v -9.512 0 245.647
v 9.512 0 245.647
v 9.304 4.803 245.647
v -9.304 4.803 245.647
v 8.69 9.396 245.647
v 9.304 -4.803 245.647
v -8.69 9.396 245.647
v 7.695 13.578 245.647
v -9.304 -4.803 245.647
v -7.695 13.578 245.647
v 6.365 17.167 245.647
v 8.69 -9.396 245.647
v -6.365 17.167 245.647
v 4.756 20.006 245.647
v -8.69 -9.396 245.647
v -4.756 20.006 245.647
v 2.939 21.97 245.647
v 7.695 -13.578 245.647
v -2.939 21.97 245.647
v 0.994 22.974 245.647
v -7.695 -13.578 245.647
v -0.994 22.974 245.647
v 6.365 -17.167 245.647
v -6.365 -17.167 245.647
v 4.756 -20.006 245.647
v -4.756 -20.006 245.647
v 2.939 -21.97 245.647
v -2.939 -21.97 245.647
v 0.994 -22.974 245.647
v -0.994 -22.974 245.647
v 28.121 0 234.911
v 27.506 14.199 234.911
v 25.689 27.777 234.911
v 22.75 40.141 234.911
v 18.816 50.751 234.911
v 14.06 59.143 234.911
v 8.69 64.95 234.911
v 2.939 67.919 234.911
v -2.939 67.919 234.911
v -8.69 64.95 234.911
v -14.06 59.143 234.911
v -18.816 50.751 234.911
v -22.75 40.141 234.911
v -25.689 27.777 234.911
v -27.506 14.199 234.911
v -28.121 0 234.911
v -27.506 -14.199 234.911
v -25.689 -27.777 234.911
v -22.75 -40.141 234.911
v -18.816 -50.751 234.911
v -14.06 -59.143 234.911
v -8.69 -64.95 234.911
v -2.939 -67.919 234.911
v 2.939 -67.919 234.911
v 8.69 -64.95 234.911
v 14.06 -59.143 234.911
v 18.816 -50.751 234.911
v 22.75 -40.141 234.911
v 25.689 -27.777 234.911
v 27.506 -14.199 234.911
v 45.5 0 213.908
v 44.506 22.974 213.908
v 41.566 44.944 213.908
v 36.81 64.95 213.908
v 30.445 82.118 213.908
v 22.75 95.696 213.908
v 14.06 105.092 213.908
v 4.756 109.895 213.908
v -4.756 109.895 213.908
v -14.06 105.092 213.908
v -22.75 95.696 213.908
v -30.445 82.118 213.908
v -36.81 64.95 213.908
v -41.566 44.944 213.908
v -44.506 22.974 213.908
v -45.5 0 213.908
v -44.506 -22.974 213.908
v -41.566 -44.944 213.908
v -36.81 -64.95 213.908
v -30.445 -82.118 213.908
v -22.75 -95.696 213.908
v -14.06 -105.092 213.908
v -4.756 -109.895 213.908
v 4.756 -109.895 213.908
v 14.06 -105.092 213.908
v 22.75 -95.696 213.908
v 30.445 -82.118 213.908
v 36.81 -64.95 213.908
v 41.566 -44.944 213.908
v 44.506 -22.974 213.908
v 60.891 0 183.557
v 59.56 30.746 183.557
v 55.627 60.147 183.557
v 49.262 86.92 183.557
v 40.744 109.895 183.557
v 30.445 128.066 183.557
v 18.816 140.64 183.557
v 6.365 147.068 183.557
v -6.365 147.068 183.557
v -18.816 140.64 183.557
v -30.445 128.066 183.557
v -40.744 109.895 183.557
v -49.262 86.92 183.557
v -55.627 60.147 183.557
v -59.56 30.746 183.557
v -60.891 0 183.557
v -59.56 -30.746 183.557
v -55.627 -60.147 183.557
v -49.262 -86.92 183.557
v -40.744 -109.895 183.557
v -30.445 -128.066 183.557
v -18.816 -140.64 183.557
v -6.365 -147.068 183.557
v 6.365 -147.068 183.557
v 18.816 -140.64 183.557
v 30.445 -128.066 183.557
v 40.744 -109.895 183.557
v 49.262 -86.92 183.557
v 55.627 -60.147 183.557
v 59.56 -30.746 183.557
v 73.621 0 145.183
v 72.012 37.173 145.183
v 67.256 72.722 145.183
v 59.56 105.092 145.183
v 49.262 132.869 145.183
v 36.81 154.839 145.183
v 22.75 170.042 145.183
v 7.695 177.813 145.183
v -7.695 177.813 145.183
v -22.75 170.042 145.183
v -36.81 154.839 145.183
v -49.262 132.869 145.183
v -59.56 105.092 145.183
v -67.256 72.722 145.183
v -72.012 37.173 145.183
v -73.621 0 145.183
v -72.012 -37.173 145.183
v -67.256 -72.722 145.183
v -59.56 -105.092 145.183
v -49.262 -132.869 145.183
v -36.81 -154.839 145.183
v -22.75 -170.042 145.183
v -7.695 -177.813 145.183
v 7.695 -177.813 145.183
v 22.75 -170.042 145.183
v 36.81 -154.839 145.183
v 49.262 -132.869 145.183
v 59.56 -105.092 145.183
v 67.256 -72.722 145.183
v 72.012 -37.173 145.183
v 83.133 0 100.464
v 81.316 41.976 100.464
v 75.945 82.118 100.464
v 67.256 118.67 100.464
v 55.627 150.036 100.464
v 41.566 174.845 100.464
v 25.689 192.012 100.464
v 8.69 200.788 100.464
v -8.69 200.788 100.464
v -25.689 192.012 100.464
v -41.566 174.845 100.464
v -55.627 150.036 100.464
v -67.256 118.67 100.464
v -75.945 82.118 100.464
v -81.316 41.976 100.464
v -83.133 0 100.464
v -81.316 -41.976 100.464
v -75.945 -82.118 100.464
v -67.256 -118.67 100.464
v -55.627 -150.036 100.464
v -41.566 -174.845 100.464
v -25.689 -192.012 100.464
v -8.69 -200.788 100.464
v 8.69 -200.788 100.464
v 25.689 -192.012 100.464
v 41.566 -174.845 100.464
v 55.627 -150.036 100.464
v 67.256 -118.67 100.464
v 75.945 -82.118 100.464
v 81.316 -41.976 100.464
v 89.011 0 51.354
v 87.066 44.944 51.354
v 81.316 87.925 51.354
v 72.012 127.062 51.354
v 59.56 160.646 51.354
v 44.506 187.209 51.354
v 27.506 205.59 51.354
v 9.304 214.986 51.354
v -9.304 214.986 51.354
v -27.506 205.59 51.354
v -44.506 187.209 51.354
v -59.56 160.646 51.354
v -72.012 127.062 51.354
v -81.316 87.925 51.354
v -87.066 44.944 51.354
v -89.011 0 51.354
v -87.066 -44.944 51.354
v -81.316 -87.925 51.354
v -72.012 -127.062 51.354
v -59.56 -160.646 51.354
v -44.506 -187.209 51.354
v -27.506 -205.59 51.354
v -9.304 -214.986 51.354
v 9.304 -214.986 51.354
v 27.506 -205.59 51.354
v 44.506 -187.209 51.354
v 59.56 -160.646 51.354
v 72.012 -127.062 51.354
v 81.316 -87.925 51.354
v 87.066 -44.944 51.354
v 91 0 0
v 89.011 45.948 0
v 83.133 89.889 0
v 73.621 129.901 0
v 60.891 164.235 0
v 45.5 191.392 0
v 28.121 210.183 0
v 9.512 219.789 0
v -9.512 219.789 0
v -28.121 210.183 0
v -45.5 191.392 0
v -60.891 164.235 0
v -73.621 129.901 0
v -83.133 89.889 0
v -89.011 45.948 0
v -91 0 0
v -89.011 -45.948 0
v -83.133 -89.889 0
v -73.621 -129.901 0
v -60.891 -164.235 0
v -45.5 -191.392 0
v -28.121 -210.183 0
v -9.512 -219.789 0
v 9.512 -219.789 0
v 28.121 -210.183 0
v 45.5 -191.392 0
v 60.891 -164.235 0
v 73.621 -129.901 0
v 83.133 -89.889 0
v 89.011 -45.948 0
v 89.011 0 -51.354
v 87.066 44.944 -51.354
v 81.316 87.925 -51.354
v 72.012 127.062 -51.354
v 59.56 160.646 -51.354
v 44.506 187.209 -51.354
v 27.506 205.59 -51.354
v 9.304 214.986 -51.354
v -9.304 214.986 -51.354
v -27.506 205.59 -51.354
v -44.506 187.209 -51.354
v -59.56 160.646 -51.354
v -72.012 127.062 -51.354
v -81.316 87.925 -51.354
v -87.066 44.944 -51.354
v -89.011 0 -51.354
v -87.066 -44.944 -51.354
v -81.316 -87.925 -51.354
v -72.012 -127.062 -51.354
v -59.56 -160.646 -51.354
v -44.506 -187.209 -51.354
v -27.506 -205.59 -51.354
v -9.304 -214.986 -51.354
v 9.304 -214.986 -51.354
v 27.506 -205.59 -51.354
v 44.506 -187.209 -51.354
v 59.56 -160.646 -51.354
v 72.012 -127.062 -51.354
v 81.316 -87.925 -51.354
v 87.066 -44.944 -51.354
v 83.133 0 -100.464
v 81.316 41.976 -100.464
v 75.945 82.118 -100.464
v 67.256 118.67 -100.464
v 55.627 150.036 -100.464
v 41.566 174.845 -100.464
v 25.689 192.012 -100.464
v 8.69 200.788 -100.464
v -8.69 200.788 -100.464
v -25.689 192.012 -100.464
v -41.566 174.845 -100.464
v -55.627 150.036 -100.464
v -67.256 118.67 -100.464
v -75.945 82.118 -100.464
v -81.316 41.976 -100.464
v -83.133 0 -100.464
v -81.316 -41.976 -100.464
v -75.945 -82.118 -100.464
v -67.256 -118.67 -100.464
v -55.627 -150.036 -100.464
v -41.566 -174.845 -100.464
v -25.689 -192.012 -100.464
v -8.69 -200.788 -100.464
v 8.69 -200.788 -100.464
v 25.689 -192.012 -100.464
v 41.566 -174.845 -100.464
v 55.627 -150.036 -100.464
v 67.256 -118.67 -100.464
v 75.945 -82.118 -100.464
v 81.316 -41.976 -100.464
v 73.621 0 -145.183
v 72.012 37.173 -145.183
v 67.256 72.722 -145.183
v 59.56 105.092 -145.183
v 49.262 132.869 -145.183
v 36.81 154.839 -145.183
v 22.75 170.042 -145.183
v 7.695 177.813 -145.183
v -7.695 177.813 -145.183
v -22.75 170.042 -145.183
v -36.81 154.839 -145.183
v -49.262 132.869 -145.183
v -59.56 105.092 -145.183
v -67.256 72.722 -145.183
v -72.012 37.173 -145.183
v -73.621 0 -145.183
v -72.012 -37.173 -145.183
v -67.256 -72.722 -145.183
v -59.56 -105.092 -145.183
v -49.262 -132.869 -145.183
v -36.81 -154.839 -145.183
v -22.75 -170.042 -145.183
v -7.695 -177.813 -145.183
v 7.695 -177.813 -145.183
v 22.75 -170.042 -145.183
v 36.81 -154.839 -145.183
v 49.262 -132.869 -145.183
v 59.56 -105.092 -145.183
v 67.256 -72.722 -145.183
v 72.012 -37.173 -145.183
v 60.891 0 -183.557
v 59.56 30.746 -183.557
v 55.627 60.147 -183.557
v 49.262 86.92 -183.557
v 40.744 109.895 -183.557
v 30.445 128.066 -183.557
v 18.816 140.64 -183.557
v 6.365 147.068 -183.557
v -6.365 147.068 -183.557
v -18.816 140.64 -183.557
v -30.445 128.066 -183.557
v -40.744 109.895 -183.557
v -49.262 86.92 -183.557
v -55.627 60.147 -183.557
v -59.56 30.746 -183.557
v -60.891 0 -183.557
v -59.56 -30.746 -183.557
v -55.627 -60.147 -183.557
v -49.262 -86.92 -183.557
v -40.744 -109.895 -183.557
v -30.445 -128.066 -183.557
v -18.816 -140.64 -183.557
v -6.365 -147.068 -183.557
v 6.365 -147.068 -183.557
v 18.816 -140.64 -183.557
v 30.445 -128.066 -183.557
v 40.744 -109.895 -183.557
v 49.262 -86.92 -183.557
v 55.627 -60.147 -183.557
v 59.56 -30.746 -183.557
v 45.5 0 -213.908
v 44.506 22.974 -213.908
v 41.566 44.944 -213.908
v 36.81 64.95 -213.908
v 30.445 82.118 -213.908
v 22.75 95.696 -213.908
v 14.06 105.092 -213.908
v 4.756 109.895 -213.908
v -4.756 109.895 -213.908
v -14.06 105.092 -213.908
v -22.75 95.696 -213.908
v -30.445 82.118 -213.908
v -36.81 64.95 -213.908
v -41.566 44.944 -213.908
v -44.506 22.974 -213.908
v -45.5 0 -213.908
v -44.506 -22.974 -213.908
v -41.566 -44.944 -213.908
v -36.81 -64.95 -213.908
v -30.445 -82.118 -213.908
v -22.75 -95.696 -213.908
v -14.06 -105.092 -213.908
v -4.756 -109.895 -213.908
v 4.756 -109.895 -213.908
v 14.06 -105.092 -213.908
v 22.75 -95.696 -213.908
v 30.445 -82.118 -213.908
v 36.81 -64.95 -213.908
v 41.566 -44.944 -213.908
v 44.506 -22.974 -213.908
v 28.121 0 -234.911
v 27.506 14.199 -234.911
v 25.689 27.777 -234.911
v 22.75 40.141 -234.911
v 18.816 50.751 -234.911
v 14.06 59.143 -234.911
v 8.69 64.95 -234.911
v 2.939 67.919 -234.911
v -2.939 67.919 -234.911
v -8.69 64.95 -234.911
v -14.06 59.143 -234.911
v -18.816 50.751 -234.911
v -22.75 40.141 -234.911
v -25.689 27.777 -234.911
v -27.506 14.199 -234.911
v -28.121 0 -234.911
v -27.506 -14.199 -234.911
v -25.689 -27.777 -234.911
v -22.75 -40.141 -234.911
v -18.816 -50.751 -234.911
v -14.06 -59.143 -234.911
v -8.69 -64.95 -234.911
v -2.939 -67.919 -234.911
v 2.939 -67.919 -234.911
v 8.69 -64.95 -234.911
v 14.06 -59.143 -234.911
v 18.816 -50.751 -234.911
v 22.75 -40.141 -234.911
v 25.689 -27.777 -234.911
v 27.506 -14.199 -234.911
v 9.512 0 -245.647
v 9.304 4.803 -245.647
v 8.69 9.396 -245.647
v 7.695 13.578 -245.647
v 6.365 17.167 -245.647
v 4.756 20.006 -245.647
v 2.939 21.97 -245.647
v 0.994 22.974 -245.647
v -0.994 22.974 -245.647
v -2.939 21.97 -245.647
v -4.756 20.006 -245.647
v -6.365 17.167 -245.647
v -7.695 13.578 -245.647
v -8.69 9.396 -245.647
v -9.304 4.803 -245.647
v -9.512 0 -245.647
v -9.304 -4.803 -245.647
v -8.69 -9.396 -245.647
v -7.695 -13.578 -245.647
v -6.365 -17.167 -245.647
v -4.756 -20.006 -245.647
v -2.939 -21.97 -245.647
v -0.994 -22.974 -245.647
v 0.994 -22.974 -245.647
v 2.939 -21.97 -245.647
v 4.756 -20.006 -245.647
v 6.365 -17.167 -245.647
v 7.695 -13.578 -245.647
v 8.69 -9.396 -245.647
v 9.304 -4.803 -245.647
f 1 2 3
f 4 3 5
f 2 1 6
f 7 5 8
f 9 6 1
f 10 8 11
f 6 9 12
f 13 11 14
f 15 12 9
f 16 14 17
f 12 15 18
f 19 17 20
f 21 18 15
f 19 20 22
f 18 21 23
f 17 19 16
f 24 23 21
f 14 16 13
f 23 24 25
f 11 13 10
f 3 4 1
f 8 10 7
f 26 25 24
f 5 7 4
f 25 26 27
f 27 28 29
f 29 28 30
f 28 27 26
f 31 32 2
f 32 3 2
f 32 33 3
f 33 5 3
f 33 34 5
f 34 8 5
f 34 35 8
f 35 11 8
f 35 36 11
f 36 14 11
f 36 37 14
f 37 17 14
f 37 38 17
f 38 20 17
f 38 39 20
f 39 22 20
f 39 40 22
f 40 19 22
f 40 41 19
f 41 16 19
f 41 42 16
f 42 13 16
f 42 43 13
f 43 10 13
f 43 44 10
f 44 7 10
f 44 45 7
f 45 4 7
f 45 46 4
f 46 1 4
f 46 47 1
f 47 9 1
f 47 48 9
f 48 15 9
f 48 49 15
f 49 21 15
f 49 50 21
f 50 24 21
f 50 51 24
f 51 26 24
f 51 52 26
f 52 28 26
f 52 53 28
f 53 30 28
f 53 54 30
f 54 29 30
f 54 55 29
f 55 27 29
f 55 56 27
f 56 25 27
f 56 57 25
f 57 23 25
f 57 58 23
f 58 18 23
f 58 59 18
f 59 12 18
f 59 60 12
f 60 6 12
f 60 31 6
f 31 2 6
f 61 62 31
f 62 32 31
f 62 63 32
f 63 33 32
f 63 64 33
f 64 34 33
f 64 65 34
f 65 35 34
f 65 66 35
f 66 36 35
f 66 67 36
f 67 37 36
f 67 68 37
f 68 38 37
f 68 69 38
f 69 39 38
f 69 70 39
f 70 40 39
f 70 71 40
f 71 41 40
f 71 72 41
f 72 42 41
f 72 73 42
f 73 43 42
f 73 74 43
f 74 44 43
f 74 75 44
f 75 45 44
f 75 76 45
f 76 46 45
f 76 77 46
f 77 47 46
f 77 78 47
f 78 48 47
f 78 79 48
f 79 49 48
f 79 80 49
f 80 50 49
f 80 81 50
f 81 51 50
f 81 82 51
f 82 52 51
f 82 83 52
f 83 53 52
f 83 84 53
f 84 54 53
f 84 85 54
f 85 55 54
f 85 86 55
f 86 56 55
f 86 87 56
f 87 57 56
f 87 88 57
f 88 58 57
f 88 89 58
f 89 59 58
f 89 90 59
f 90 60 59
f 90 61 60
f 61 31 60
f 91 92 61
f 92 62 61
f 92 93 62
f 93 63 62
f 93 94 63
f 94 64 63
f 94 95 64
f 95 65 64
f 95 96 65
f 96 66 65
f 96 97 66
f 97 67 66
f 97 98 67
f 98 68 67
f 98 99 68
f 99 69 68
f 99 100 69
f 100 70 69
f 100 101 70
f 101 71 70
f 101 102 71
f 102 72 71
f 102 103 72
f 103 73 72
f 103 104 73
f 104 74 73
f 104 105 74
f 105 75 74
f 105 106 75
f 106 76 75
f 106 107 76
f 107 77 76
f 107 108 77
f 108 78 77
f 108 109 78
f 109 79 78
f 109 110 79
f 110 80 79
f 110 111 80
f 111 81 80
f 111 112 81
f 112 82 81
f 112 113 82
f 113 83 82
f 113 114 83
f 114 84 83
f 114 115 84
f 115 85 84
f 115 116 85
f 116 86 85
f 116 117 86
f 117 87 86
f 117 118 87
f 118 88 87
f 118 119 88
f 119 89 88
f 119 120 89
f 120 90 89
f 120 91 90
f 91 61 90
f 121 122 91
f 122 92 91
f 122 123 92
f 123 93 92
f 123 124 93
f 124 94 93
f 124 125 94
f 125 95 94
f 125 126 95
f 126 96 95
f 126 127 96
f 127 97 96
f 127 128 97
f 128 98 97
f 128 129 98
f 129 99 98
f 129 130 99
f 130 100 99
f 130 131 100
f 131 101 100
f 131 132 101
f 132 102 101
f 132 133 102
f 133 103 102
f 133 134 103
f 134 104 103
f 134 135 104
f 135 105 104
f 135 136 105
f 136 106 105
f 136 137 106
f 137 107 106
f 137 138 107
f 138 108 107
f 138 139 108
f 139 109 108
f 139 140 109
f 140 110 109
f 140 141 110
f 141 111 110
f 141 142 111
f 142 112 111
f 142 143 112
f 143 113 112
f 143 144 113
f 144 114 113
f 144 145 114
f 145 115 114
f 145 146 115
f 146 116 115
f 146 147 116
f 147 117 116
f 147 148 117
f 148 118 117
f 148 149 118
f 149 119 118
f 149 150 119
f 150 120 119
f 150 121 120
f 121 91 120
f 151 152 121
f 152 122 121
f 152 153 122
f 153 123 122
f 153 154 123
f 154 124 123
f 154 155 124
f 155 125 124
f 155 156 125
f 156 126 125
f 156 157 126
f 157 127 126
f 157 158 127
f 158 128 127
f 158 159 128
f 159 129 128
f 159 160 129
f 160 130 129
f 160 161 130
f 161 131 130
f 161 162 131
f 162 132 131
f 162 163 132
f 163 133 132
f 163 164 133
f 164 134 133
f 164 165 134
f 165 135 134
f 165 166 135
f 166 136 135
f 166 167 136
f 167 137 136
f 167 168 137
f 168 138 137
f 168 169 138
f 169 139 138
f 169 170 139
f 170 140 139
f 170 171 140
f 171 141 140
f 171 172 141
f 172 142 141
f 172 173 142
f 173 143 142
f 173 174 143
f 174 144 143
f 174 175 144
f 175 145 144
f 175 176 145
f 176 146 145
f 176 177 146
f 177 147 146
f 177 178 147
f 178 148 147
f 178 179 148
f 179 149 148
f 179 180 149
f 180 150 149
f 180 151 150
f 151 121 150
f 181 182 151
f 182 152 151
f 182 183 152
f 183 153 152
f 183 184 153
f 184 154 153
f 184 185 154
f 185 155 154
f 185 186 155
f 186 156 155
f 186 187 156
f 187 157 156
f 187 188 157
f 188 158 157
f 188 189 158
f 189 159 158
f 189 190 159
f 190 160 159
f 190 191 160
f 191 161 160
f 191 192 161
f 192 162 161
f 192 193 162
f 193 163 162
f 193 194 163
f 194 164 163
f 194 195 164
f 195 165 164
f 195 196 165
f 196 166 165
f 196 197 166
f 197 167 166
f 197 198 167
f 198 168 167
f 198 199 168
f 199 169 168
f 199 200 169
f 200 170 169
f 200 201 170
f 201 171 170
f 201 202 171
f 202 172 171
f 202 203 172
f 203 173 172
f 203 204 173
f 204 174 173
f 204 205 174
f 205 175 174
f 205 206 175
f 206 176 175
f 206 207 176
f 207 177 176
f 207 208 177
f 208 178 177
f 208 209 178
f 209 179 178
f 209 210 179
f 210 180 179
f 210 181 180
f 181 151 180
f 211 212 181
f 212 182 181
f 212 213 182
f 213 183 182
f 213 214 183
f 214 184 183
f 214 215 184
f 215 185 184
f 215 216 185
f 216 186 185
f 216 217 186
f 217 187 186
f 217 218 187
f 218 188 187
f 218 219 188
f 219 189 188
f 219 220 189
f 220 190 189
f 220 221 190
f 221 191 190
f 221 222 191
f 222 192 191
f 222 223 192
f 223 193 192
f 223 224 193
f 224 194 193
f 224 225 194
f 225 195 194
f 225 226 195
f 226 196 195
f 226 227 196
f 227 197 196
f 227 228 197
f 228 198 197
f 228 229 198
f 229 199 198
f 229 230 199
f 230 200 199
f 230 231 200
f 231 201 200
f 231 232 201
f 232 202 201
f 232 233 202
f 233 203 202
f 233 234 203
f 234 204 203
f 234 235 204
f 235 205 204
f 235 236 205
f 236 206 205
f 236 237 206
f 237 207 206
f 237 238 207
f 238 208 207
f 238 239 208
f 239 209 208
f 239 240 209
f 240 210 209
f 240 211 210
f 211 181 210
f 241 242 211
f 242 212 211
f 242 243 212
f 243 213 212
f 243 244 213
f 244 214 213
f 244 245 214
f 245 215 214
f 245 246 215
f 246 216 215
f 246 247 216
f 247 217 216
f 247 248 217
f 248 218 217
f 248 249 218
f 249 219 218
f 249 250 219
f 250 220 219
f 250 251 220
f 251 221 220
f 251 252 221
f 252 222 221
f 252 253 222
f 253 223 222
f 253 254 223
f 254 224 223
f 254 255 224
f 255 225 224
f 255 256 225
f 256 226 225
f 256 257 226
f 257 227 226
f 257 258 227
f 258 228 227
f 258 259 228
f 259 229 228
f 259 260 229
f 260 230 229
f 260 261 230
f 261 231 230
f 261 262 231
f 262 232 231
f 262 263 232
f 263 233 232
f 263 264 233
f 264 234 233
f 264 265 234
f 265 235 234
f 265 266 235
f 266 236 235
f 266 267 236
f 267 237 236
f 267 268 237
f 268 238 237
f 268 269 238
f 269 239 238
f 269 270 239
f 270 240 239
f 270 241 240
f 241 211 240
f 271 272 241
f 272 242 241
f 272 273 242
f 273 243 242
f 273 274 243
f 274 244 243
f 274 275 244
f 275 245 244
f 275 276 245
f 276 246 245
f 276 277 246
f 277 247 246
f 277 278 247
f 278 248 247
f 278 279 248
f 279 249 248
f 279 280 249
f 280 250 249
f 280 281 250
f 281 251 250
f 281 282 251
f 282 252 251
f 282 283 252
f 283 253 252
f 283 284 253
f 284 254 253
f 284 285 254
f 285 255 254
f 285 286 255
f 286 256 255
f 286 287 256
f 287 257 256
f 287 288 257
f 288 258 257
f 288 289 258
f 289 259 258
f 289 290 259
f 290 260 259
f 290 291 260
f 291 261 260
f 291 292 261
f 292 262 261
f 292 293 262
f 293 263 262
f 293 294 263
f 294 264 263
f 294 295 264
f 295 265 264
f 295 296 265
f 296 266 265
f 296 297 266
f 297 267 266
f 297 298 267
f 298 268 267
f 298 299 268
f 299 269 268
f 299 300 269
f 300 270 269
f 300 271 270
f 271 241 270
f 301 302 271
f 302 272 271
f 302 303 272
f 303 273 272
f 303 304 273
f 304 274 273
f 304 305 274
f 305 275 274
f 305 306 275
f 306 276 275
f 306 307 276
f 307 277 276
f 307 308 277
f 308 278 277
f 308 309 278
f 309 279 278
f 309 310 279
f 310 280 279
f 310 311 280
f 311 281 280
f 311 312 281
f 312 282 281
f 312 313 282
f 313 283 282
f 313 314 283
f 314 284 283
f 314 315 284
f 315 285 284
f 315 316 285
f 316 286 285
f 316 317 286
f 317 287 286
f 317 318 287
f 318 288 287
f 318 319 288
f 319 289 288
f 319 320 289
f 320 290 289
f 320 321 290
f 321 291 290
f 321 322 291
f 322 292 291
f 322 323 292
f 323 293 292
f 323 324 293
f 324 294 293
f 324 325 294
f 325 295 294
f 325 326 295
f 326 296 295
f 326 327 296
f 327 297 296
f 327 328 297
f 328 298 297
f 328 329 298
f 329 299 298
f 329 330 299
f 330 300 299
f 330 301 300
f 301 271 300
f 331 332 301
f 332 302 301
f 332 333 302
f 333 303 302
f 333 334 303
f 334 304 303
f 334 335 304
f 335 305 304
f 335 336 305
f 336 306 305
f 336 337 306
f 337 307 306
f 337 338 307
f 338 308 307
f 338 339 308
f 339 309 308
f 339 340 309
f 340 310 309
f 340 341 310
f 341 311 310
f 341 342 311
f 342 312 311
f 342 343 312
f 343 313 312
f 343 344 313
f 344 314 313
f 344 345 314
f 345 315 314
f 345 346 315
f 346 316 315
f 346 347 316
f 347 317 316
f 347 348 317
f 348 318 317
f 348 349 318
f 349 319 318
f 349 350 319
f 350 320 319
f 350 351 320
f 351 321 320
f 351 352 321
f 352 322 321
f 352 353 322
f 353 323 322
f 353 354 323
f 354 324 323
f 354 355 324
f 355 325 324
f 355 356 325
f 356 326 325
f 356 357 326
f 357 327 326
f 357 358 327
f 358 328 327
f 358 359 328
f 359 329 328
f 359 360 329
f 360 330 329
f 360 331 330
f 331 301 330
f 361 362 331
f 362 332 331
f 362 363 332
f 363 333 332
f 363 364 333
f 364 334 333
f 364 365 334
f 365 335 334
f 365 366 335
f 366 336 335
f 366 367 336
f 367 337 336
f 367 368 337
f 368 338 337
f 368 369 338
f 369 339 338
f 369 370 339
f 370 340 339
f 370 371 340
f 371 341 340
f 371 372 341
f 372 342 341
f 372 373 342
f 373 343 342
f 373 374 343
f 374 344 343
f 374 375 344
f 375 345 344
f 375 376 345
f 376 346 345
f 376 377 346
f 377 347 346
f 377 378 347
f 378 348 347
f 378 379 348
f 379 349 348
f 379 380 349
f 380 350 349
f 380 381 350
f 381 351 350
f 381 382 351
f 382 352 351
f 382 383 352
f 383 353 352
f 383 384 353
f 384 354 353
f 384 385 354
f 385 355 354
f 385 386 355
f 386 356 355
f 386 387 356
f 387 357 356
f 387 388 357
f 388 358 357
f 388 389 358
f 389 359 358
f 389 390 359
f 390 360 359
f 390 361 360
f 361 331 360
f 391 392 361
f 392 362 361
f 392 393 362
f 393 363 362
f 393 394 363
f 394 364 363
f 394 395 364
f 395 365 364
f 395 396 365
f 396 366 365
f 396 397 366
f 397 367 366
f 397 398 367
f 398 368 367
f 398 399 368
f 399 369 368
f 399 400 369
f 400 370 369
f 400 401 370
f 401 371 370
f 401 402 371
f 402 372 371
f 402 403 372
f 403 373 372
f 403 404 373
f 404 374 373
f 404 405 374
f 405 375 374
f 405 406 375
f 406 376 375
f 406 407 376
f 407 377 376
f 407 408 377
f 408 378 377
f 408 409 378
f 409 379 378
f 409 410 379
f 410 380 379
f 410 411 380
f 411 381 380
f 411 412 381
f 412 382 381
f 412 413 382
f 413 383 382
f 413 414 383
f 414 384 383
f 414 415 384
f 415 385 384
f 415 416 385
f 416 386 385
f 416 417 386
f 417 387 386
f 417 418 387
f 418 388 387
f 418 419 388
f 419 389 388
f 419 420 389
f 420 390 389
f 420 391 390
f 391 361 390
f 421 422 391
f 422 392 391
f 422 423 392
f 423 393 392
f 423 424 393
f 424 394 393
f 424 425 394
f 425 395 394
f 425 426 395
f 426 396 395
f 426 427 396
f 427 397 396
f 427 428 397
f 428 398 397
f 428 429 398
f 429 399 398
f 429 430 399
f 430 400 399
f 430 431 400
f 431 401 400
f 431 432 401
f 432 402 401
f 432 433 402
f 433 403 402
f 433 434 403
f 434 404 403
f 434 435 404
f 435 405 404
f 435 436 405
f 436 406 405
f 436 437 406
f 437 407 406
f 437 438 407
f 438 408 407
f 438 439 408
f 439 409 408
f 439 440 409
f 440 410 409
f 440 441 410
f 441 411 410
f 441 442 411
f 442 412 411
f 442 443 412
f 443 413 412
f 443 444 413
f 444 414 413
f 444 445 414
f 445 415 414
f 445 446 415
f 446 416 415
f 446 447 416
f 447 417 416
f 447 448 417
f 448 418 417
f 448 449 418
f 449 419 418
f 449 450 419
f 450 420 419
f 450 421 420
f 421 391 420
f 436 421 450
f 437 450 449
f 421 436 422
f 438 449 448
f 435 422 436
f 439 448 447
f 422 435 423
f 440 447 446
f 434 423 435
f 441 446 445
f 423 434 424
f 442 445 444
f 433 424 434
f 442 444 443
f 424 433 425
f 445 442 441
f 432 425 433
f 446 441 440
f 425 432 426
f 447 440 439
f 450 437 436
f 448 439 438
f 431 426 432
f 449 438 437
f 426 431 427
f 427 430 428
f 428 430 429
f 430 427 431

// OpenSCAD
// Generated by SolidPython 1.0.1 on 2020-07-29 00:46:48


scale(v = [7, 17, 19]) {
	sphere(r = 13);
}
/***********************************************
*********      SolidPython code:      **********
************************************************
 
# import packages: SolidPython
from solid import *
from solid.utils import *
from itertools import chain, combinations, permutations


class Resize:

    def __init__(self, scad_file):
        self.scad_file = scad_file
        #self.scad_file = import_scad(scad_file)
        # cone/cylinder param:
        self.r1 = 0
        self.r2 = 0
        self.h = 0
        # rectangular prism param:
        self.w = 0
        self.l = 0
        # ellipse param:
        self.r = 0

    # import OpenScad code (file name corresponds to shape)


    # classify shape + parameters
    def assign(self, param1, param2, param3):
        if self.scad_file == 'cone.scad':
            self.r1 = param1
            self.r2 = param2
            self.h = param3
        elif self.scad_file == 'cylinder.scad':
            self.r1 = param1
            self.r2 = param2
            self.h = param3
        elif self.scad_file == 'rectangularPrism.scad':
            self.h = param1
            self.l = param2
            self.w = param3
        else:
            self.r = param1
            self.h = param2

    # resize parameters
    def iterate(self):
        x = range(3, 20, 2)
        i = 1
        if self.scad_file == 'cone.scad':
            tempList = list(permutations(x, 2))
            for temp in tempList:
                param1 = temp[0]
                param2 = temp[1]
                filepath = 'produced_scad_files/' + 'cone' + str(param1) + '_' + str(param2) + '_' + '.scad'
                scad_render_to_file(cylinder(h=param1, r1=param2, r2=0), filepath)

        elif self.scad_file == 'cylinder.scad':
            tempList = list(permutations(x, 3))
            for temp in tempList:
                param1 = temp[0]
                param2 = temp[1]
                filepath = 'produced_scad_files/' + 'cylinder' + str(param1) + '_' + str(param2) + '_' + '.scad'
                scad_render_to_file(cylinder(h=param1, r1=param2, r2=param2), filepath)

        elif self.scad_file == 'rectangularPrism.scad':
            tempList = list(permutations(x, 3))
            for temp in tempList:
                param1 = temp[0]
                param2 = temp[1]
                param3 = temp[2]
                filepath = 'produced_scad_files/' + 'rectangularPrism' + str(param1) + '_' + str(param2) + '_' + str(
                    param3) + '.scad'
                scad_render_to_file(cube(size=(param1, param2, param3)), filepath)

        elif self.scad_file == 'ellipse.scad':
            tempList = list(permutations(x, 4))
            for temp in tempList:
                param1 = temp[0]
                param2 = temp[1]
                param3 = temp[2]
                param4 = temp[3]
                filepath = 'produced_scad_files/' + 'ellipse' + str(param1) + '_' + str(param2) + '_' + str(param3) + '_' + str(param4) + '.scad'
                scad_render_to_file(scale([param1, param2, param3])(sphere(r=param4)), filepath)

    def render_to_scadfile(self):
        scad_render_to_file(scad, 'example.scad') 
 
************************************************/
